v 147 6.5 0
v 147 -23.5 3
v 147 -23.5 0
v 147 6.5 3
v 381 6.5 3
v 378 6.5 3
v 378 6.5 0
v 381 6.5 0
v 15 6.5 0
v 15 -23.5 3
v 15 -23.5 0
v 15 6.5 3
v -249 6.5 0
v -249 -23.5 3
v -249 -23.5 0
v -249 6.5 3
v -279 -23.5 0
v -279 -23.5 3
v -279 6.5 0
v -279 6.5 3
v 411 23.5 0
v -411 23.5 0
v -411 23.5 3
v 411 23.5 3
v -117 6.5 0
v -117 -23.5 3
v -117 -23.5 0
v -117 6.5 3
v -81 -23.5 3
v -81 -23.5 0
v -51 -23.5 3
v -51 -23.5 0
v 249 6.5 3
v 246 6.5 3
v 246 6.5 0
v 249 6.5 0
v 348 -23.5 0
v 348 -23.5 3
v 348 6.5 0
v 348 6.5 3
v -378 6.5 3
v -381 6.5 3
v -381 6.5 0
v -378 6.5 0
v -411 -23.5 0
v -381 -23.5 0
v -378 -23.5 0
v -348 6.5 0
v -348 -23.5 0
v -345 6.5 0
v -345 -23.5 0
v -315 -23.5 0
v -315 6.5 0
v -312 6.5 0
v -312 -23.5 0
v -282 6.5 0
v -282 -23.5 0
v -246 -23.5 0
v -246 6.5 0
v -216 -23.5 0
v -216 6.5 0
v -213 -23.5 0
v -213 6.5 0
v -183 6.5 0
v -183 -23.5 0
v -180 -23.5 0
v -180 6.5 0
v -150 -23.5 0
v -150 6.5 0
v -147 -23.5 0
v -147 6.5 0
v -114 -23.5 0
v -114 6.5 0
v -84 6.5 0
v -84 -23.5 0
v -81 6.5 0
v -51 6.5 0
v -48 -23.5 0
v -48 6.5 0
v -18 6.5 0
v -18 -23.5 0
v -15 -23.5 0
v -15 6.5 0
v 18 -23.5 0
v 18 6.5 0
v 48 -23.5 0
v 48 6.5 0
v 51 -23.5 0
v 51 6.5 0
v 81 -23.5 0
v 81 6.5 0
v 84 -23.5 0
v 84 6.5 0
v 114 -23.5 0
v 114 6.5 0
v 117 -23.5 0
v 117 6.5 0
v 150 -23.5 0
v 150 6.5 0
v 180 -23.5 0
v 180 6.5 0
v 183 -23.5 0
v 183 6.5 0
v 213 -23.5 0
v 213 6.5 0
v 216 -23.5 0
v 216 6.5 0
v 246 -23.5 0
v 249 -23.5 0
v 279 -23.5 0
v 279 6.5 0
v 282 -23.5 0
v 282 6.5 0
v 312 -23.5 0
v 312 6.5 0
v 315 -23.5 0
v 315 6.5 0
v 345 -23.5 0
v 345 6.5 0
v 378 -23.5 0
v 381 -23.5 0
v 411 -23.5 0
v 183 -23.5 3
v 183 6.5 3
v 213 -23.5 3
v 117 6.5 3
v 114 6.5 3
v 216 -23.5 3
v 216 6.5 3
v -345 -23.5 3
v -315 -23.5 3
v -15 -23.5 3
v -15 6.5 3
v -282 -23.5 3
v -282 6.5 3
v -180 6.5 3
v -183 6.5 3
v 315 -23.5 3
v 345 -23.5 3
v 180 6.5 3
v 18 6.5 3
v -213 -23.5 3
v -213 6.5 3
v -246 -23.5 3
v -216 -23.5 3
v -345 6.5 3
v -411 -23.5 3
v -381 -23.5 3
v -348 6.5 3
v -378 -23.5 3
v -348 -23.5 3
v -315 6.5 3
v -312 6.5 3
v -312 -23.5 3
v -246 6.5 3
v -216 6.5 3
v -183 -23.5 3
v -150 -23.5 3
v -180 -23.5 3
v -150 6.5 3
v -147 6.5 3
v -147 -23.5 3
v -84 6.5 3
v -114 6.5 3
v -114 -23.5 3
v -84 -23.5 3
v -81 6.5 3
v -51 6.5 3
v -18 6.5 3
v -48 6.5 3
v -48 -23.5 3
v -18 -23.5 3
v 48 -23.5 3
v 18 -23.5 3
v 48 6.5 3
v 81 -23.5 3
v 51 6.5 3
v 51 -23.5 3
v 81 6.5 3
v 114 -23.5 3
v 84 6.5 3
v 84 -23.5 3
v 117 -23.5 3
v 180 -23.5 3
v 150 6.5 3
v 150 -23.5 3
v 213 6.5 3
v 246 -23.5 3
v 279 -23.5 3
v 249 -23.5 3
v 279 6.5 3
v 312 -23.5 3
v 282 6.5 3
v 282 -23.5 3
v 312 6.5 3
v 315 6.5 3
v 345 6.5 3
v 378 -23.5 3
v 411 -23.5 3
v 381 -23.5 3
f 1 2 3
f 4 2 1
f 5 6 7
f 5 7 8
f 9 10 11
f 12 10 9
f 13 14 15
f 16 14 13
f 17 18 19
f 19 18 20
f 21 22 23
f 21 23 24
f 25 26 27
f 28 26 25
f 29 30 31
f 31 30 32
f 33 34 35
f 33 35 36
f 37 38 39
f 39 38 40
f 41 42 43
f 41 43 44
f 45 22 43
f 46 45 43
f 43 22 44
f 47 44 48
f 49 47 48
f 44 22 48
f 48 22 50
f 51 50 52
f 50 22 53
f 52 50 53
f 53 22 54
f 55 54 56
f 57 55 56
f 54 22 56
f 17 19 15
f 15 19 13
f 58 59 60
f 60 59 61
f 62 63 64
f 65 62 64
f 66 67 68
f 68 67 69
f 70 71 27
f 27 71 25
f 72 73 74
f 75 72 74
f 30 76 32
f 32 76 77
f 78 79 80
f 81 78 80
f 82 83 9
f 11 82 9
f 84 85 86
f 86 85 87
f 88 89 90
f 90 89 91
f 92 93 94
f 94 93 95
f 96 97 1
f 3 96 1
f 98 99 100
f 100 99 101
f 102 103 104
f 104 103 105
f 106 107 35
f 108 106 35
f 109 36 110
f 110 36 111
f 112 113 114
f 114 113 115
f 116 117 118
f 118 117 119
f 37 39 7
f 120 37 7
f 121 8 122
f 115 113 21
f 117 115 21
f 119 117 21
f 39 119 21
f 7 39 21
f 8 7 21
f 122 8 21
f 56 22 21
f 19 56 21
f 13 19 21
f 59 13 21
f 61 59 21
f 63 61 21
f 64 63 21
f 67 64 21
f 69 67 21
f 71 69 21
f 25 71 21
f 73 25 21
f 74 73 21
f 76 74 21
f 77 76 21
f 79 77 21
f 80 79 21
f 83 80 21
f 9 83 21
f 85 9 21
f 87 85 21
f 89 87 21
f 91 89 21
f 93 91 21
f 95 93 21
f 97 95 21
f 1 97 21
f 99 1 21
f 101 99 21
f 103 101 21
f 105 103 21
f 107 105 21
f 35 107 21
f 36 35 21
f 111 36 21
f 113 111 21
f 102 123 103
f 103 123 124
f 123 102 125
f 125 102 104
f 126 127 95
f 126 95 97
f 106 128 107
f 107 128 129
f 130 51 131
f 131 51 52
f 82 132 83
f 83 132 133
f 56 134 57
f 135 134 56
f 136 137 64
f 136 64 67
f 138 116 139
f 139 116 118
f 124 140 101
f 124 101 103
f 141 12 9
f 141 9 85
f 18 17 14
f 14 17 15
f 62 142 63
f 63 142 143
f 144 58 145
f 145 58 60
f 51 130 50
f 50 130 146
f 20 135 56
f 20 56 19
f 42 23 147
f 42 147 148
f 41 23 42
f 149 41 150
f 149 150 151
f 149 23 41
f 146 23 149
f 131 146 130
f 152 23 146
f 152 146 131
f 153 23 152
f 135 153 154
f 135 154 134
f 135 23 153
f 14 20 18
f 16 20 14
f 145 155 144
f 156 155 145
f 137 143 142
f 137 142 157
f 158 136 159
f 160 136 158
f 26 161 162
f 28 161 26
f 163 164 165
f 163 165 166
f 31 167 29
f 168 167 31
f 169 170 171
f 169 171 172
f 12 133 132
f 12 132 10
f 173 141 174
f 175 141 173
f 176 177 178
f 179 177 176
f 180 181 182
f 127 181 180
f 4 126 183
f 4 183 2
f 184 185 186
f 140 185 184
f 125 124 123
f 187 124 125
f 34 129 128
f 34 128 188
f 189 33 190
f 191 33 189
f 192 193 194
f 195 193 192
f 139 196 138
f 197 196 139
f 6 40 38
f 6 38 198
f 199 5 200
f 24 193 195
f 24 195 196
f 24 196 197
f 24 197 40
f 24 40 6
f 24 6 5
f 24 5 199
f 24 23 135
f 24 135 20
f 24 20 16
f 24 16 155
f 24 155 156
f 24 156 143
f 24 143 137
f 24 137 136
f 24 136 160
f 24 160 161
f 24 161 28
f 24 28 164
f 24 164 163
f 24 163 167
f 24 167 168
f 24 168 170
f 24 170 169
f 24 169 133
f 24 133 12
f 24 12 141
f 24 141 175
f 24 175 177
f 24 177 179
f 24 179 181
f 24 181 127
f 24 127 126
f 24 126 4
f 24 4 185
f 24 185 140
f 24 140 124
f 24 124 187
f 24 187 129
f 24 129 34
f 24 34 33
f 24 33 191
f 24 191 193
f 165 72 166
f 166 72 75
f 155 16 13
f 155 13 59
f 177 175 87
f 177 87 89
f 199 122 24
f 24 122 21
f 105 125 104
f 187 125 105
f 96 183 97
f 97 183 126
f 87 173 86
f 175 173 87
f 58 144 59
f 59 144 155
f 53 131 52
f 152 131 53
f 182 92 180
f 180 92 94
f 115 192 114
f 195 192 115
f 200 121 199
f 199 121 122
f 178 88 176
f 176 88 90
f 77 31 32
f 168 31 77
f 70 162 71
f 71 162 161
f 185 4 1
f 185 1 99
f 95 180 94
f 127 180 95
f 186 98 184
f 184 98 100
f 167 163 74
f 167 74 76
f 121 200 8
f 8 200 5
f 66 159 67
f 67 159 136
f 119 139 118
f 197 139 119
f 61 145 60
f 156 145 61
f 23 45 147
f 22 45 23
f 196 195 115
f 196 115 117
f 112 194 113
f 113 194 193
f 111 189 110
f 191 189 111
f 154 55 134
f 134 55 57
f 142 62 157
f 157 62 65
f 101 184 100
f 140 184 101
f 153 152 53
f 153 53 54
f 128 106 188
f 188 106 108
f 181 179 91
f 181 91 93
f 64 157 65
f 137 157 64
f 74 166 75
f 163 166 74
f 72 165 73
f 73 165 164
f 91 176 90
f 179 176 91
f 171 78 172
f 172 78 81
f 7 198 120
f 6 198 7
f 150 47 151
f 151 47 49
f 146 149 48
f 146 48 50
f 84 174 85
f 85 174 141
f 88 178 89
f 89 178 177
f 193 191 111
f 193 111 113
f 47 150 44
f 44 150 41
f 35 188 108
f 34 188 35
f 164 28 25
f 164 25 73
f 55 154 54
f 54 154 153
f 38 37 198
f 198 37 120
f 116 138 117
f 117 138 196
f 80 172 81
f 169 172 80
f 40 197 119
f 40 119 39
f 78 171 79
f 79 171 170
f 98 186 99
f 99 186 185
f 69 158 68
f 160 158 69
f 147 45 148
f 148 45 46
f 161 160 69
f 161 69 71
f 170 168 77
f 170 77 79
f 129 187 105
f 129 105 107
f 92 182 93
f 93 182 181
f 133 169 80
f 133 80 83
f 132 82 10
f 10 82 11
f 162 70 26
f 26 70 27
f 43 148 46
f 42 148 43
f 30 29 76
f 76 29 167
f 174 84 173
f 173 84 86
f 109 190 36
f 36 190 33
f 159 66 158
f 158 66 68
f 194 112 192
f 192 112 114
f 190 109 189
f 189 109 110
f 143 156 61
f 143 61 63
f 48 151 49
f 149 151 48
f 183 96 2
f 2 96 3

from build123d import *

# Parameters (mm, degrees)
SKETCH1_W           = 822
SKETCH1_H           = 47
BOSS_EXTRUDE1_DEPTH = 3
SKETCH2_W           = 3
SKETCH2_H           = 30
CUT_EXTRUDE1_DEPTH  = 4
LPATTERN1_COUNT     = 24
LPATTERN1_PITCH     = 33


with BuildPart() as part:
    # Sketch1 → Boss-Extrude1 (new body)
    with BuildSketch(Plane.XY):
        Rectangle(SKETCH1_W, SKETCH1_H)
    extrude(amount=BOSS_EXTRUDE1_DEPTH)

    # Sketch2 → Cut-Extrude1 (cut, through all)
    with BuildSketch(Plane.XY.offset(3)):
        with Locations((-379.5, -8.5)):
            Rectangle(SKETCH2_W, SKETCH2_H)
    cut_extrude1 = extrude(amount=-CUT_EXTRUDE1_DEPTH, mode=Mode.SUBTRACT)

    # LPattern1: Cut-Extrude1 ×24
    with Locations(*[(i * LPATTERN1_PITCH, 0, 0) for i in range(1, LPATTERN1_COUNT)]):
        add(cut_extrude1, mode=Mode.SUBTRACT)


solid = part.part
